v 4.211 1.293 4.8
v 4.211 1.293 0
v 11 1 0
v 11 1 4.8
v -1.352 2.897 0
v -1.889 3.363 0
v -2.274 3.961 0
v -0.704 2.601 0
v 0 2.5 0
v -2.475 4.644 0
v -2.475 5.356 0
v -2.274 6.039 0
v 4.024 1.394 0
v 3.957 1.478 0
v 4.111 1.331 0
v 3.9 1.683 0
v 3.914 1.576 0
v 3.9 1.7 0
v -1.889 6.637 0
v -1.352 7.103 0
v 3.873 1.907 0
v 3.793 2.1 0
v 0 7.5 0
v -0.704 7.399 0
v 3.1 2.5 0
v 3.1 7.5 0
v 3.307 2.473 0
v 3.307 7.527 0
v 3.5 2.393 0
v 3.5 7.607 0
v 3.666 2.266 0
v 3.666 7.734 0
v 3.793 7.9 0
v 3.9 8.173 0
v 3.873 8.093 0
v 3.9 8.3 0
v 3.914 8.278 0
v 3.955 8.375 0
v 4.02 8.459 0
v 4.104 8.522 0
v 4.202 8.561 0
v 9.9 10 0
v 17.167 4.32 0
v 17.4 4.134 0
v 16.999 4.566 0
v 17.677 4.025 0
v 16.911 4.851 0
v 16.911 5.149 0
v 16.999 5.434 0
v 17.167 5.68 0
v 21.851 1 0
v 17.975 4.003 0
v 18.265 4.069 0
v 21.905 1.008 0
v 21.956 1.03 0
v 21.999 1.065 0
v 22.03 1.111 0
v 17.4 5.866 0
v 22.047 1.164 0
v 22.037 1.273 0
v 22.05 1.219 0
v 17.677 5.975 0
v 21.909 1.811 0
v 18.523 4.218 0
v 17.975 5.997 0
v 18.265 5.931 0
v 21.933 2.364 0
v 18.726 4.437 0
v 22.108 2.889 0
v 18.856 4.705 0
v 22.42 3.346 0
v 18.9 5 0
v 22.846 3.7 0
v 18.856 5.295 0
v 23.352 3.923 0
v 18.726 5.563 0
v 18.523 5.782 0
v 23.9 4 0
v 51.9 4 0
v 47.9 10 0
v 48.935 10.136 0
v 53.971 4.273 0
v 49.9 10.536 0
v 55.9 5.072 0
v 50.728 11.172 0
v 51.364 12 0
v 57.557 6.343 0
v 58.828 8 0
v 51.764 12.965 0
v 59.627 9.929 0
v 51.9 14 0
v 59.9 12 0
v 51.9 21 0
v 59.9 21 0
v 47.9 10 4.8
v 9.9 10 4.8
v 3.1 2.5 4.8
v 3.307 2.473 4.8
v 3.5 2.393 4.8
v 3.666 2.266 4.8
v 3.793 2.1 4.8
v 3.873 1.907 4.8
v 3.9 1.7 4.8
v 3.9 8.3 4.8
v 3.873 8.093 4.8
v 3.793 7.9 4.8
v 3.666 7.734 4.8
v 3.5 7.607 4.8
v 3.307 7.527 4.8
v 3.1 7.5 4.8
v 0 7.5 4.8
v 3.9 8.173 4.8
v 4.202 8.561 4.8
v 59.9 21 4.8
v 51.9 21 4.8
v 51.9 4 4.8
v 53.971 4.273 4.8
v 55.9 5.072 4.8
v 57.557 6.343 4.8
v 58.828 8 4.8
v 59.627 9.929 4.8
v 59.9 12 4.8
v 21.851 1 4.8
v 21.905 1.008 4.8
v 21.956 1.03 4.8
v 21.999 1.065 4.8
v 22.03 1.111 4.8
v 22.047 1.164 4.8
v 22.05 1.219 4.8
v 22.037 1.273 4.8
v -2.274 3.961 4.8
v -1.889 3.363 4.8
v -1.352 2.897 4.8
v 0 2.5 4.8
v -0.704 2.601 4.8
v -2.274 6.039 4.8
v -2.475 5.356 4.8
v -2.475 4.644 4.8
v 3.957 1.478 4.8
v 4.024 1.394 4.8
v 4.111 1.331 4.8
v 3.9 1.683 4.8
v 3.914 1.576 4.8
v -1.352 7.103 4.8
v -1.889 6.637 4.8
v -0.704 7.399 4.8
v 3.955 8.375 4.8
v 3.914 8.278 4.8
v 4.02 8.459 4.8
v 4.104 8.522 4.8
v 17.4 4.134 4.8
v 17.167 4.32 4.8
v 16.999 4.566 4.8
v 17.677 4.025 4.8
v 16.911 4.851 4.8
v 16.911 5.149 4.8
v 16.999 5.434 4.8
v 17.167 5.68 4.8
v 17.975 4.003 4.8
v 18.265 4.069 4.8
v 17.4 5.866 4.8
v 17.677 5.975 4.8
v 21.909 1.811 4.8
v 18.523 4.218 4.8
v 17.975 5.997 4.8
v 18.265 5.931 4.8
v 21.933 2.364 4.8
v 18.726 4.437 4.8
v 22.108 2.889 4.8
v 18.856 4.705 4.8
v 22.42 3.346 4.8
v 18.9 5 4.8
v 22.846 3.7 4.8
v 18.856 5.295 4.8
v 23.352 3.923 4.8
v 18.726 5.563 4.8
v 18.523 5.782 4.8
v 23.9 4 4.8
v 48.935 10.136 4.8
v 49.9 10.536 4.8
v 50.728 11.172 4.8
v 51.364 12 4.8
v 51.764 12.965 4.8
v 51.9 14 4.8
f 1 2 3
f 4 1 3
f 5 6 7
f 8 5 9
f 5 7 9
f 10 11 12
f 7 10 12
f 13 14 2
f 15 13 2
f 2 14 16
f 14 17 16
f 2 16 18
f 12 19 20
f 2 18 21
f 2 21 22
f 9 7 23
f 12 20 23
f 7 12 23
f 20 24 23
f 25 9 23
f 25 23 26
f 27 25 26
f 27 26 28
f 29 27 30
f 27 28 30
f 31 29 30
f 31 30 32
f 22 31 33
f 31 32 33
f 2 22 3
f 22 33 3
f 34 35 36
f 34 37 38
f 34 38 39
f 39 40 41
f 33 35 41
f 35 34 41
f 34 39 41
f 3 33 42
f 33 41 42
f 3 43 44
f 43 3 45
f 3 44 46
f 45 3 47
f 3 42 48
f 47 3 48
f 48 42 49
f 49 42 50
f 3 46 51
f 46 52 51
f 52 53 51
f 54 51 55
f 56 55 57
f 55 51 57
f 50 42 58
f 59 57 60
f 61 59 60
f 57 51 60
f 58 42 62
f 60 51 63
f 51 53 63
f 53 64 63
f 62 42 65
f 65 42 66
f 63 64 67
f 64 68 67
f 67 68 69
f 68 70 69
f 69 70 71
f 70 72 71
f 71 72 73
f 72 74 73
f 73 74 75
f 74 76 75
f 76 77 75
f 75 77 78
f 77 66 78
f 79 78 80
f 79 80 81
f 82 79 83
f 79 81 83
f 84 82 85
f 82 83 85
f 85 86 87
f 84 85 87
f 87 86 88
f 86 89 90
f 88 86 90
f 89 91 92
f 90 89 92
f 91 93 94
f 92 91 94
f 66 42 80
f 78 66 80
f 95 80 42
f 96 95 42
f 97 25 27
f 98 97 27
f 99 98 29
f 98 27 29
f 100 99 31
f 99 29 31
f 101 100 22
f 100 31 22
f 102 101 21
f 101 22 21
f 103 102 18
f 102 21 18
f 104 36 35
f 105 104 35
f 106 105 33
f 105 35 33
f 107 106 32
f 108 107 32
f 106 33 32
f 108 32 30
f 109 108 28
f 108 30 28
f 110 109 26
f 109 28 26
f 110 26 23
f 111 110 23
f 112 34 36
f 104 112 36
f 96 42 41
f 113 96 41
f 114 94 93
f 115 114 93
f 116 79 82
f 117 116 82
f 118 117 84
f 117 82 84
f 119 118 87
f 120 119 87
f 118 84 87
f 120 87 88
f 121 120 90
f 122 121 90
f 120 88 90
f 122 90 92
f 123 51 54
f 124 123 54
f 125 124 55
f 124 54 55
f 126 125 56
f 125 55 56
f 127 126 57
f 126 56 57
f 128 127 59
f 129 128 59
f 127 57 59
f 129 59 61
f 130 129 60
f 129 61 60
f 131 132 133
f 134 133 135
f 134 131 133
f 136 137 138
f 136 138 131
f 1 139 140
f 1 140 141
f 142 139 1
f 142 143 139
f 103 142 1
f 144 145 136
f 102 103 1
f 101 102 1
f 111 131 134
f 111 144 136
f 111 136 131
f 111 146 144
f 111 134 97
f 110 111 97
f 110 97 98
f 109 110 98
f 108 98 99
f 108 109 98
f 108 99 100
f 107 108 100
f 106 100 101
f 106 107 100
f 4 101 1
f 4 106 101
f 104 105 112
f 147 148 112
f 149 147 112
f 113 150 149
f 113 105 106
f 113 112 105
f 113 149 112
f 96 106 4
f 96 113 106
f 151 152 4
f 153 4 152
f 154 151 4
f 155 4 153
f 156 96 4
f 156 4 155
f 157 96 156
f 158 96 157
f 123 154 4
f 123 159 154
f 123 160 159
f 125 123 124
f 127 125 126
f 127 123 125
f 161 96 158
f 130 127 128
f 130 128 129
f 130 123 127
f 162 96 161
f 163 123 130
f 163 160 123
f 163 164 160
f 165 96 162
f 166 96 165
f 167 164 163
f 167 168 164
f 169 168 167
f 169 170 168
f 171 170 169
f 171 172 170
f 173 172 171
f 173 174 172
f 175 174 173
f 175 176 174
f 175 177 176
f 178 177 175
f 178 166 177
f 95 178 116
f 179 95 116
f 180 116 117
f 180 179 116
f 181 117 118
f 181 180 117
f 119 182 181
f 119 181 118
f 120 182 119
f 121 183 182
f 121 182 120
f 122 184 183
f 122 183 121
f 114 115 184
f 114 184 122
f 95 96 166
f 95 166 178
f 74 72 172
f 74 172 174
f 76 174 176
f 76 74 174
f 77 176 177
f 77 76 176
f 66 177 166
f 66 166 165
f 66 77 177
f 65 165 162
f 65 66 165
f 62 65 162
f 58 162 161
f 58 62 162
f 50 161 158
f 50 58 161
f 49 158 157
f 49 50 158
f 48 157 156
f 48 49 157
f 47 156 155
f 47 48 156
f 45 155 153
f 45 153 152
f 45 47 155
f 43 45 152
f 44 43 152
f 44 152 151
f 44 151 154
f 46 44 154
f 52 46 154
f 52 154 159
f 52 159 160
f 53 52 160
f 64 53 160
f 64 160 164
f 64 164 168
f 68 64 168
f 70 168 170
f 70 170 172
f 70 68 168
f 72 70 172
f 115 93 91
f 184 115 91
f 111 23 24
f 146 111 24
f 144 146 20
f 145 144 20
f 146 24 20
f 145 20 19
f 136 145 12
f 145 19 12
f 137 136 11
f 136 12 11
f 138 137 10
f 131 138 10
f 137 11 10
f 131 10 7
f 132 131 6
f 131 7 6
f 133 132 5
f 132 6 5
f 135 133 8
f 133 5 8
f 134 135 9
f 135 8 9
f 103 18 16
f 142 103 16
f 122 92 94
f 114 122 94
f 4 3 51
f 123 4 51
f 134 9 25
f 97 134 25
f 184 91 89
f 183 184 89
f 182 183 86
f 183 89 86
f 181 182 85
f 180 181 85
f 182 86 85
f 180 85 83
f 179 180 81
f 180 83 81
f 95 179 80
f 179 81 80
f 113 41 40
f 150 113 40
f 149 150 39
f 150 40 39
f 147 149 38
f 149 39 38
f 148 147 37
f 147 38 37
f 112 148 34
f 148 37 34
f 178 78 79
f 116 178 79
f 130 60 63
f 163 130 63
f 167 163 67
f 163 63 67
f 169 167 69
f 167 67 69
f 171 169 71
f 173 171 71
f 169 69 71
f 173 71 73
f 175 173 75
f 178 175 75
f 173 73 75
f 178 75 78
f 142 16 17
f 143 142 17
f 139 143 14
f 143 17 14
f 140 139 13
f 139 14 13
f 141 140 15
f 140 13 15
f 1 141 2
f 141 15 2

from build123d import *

# Parameters (mm, degrees)
F0_R     = 1
F1_DEPTH = 4.8


with BuildPart() as f1:
    # F0 (on Top) → F1 (new body)
    with BuildSketch(Plane.XY):
        with BuildLine():
            ThreePointArc((51.9, 4), (57.556854, 6.343146), (59.9, 12))
            Line((59.9, 12), (59.9, 21))
            Line((59.9, 21), (51.9, 21))
            Line((51.9, 21), (51.9, 14))
            ThreePointArc((51.9, 14), (50.728427, 11.171573), (47.9, 10))
            Line((47.9, 10), (9.9, 10))
            Line((9.9, 10), (4.202064, 8.561127))
            ThreePointArc((4.202064, 8.561127), (3.984426, 8.419092), (3.9, 8.173302))
            Line((3.9, 8.173302), (3.9, 8.3))
            ThreePointArc((3.9, 8.3), (3.665685, 7.734315), (3.1, 7.5))
            Line((3.1, 7.5), (0, 7.5))
            ThreePointArc((0, 7.5), (-2.5, 5), (0, 2.5))
            Line((0, 2.5), (3.1, 2.5))
            ThreePointArc((3.1, 2.5), (3.665685, 2.265685), (3.9, 1.7))
            Line((3.9, 1.7), (3.9, 1.682928))
            ThreePointArc((3.9, 1.682928), (3.987383, 1.433388), (4.211352, 1.292875))
            Line((4.211352, 1.292875), (11, 1))
            Line((11, 1), (21.85061, 1))
            ThreePointArc((21.85061, 1), (22.015754, 1.087185), (22.036918, 1.272727))
            ThreePointArc((22.036918, 1.272727), (22.248554, 3.128152), (23.9, 4))
            Line((23.9, 4), (51.9, 4))
        make_face()
        with Locations((17.9, 5)):
            Circle(F0_R, mode=Mode.SUBTRACT)
    extrude(amount=F1_DEPTH)


solid = f1.part
